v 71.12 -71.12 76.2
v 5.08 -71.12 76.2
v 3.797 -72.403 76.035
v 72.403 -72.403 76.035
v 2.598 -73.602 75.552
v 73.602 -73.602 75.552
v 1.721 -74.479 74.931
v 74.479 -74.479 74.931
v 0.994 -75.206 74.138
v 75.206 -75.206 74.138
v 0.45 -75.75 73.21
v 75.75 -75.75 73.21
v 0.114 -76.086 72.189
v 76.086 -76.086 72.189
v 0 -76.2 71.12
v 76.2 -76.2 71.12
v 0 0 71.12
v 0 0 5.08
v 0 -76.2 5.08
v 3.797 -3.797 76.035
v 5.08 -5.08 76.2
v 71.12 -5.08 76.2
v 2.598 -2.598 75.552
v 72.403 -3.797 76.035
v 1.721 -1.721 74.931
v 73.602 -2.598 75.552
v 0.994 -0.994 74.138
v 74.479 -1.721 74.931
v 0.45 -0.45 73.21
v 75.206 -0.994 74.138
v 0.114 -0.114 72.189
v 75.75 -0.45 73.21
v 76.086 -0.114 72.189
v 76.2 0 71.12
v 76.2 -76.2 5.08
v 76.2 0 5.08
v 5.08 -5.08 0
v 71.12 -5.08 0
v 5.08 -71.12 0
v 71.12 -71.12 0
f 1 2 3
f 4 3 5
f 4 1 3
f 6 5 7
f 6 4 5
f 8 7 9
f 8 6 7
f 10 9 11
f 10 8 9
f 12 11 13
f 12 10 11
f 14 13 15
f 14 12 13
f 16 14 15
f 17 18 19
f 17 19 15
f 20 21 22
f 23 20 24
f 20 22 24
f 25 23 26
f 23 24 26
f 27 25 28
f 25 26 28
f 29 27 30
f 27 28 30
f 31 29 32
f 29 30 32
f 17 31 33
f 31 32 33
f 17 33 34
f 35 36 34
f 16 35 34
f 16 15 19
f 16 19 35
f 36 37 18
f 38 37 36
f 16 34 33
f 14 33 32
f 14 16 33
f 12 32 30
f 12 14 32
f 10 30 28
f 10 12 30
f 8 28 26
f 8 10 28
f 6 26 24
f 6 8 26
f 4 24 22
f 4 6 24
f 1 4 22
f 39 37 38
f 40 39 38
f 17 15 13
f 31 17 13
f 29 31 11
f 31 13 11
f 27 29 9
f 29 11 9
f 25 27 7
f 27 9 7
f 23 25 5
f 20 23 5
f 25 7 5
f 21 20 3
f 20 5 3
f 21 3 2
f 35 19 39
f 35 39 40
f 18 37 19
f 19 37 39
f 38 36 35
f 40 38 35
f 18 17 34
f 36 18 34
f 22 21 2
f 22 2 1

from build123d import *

# Parameters (mm, degrees)
F0_W     = 76.2
F0_H     = 76.2
F1_DEPTH = 76.2
F2_R     = 5.08
F3_SIZE  = 5.08


with BuildPart() as f1:
    # F0 (on Front) → F1 (new body)
    with BuildSketch(Plane.XZ):
        with Locations((38.1, 38.1)):
            Rectangle(F0_W, F0_H)
    extrude(amount=F1_DEPTH)

    # F2
    f2_edges = [f1.edges().sort_by_distance(p)[0] for p in [
        (76.2, -38.1, 76.2),
        (0, -38.1, 76.2),
        (38.1, 0, 76.2),
        (38.1, -76.2, 76.2),
    ]]
    fillet(f2_edges, radius=F2_R)

    # F3
    f3_edges = [f1.edges().sort_by_distance(p)[0] for p in [
        (0, -38.1, 0),
        (76.2, -38.1, 0),
        (38.1, 0, 0),
        (38.1, -76.2, 0),
    ]]
    chamfer(f3_edges, length=F3_SIZE)


solid = f1.part
